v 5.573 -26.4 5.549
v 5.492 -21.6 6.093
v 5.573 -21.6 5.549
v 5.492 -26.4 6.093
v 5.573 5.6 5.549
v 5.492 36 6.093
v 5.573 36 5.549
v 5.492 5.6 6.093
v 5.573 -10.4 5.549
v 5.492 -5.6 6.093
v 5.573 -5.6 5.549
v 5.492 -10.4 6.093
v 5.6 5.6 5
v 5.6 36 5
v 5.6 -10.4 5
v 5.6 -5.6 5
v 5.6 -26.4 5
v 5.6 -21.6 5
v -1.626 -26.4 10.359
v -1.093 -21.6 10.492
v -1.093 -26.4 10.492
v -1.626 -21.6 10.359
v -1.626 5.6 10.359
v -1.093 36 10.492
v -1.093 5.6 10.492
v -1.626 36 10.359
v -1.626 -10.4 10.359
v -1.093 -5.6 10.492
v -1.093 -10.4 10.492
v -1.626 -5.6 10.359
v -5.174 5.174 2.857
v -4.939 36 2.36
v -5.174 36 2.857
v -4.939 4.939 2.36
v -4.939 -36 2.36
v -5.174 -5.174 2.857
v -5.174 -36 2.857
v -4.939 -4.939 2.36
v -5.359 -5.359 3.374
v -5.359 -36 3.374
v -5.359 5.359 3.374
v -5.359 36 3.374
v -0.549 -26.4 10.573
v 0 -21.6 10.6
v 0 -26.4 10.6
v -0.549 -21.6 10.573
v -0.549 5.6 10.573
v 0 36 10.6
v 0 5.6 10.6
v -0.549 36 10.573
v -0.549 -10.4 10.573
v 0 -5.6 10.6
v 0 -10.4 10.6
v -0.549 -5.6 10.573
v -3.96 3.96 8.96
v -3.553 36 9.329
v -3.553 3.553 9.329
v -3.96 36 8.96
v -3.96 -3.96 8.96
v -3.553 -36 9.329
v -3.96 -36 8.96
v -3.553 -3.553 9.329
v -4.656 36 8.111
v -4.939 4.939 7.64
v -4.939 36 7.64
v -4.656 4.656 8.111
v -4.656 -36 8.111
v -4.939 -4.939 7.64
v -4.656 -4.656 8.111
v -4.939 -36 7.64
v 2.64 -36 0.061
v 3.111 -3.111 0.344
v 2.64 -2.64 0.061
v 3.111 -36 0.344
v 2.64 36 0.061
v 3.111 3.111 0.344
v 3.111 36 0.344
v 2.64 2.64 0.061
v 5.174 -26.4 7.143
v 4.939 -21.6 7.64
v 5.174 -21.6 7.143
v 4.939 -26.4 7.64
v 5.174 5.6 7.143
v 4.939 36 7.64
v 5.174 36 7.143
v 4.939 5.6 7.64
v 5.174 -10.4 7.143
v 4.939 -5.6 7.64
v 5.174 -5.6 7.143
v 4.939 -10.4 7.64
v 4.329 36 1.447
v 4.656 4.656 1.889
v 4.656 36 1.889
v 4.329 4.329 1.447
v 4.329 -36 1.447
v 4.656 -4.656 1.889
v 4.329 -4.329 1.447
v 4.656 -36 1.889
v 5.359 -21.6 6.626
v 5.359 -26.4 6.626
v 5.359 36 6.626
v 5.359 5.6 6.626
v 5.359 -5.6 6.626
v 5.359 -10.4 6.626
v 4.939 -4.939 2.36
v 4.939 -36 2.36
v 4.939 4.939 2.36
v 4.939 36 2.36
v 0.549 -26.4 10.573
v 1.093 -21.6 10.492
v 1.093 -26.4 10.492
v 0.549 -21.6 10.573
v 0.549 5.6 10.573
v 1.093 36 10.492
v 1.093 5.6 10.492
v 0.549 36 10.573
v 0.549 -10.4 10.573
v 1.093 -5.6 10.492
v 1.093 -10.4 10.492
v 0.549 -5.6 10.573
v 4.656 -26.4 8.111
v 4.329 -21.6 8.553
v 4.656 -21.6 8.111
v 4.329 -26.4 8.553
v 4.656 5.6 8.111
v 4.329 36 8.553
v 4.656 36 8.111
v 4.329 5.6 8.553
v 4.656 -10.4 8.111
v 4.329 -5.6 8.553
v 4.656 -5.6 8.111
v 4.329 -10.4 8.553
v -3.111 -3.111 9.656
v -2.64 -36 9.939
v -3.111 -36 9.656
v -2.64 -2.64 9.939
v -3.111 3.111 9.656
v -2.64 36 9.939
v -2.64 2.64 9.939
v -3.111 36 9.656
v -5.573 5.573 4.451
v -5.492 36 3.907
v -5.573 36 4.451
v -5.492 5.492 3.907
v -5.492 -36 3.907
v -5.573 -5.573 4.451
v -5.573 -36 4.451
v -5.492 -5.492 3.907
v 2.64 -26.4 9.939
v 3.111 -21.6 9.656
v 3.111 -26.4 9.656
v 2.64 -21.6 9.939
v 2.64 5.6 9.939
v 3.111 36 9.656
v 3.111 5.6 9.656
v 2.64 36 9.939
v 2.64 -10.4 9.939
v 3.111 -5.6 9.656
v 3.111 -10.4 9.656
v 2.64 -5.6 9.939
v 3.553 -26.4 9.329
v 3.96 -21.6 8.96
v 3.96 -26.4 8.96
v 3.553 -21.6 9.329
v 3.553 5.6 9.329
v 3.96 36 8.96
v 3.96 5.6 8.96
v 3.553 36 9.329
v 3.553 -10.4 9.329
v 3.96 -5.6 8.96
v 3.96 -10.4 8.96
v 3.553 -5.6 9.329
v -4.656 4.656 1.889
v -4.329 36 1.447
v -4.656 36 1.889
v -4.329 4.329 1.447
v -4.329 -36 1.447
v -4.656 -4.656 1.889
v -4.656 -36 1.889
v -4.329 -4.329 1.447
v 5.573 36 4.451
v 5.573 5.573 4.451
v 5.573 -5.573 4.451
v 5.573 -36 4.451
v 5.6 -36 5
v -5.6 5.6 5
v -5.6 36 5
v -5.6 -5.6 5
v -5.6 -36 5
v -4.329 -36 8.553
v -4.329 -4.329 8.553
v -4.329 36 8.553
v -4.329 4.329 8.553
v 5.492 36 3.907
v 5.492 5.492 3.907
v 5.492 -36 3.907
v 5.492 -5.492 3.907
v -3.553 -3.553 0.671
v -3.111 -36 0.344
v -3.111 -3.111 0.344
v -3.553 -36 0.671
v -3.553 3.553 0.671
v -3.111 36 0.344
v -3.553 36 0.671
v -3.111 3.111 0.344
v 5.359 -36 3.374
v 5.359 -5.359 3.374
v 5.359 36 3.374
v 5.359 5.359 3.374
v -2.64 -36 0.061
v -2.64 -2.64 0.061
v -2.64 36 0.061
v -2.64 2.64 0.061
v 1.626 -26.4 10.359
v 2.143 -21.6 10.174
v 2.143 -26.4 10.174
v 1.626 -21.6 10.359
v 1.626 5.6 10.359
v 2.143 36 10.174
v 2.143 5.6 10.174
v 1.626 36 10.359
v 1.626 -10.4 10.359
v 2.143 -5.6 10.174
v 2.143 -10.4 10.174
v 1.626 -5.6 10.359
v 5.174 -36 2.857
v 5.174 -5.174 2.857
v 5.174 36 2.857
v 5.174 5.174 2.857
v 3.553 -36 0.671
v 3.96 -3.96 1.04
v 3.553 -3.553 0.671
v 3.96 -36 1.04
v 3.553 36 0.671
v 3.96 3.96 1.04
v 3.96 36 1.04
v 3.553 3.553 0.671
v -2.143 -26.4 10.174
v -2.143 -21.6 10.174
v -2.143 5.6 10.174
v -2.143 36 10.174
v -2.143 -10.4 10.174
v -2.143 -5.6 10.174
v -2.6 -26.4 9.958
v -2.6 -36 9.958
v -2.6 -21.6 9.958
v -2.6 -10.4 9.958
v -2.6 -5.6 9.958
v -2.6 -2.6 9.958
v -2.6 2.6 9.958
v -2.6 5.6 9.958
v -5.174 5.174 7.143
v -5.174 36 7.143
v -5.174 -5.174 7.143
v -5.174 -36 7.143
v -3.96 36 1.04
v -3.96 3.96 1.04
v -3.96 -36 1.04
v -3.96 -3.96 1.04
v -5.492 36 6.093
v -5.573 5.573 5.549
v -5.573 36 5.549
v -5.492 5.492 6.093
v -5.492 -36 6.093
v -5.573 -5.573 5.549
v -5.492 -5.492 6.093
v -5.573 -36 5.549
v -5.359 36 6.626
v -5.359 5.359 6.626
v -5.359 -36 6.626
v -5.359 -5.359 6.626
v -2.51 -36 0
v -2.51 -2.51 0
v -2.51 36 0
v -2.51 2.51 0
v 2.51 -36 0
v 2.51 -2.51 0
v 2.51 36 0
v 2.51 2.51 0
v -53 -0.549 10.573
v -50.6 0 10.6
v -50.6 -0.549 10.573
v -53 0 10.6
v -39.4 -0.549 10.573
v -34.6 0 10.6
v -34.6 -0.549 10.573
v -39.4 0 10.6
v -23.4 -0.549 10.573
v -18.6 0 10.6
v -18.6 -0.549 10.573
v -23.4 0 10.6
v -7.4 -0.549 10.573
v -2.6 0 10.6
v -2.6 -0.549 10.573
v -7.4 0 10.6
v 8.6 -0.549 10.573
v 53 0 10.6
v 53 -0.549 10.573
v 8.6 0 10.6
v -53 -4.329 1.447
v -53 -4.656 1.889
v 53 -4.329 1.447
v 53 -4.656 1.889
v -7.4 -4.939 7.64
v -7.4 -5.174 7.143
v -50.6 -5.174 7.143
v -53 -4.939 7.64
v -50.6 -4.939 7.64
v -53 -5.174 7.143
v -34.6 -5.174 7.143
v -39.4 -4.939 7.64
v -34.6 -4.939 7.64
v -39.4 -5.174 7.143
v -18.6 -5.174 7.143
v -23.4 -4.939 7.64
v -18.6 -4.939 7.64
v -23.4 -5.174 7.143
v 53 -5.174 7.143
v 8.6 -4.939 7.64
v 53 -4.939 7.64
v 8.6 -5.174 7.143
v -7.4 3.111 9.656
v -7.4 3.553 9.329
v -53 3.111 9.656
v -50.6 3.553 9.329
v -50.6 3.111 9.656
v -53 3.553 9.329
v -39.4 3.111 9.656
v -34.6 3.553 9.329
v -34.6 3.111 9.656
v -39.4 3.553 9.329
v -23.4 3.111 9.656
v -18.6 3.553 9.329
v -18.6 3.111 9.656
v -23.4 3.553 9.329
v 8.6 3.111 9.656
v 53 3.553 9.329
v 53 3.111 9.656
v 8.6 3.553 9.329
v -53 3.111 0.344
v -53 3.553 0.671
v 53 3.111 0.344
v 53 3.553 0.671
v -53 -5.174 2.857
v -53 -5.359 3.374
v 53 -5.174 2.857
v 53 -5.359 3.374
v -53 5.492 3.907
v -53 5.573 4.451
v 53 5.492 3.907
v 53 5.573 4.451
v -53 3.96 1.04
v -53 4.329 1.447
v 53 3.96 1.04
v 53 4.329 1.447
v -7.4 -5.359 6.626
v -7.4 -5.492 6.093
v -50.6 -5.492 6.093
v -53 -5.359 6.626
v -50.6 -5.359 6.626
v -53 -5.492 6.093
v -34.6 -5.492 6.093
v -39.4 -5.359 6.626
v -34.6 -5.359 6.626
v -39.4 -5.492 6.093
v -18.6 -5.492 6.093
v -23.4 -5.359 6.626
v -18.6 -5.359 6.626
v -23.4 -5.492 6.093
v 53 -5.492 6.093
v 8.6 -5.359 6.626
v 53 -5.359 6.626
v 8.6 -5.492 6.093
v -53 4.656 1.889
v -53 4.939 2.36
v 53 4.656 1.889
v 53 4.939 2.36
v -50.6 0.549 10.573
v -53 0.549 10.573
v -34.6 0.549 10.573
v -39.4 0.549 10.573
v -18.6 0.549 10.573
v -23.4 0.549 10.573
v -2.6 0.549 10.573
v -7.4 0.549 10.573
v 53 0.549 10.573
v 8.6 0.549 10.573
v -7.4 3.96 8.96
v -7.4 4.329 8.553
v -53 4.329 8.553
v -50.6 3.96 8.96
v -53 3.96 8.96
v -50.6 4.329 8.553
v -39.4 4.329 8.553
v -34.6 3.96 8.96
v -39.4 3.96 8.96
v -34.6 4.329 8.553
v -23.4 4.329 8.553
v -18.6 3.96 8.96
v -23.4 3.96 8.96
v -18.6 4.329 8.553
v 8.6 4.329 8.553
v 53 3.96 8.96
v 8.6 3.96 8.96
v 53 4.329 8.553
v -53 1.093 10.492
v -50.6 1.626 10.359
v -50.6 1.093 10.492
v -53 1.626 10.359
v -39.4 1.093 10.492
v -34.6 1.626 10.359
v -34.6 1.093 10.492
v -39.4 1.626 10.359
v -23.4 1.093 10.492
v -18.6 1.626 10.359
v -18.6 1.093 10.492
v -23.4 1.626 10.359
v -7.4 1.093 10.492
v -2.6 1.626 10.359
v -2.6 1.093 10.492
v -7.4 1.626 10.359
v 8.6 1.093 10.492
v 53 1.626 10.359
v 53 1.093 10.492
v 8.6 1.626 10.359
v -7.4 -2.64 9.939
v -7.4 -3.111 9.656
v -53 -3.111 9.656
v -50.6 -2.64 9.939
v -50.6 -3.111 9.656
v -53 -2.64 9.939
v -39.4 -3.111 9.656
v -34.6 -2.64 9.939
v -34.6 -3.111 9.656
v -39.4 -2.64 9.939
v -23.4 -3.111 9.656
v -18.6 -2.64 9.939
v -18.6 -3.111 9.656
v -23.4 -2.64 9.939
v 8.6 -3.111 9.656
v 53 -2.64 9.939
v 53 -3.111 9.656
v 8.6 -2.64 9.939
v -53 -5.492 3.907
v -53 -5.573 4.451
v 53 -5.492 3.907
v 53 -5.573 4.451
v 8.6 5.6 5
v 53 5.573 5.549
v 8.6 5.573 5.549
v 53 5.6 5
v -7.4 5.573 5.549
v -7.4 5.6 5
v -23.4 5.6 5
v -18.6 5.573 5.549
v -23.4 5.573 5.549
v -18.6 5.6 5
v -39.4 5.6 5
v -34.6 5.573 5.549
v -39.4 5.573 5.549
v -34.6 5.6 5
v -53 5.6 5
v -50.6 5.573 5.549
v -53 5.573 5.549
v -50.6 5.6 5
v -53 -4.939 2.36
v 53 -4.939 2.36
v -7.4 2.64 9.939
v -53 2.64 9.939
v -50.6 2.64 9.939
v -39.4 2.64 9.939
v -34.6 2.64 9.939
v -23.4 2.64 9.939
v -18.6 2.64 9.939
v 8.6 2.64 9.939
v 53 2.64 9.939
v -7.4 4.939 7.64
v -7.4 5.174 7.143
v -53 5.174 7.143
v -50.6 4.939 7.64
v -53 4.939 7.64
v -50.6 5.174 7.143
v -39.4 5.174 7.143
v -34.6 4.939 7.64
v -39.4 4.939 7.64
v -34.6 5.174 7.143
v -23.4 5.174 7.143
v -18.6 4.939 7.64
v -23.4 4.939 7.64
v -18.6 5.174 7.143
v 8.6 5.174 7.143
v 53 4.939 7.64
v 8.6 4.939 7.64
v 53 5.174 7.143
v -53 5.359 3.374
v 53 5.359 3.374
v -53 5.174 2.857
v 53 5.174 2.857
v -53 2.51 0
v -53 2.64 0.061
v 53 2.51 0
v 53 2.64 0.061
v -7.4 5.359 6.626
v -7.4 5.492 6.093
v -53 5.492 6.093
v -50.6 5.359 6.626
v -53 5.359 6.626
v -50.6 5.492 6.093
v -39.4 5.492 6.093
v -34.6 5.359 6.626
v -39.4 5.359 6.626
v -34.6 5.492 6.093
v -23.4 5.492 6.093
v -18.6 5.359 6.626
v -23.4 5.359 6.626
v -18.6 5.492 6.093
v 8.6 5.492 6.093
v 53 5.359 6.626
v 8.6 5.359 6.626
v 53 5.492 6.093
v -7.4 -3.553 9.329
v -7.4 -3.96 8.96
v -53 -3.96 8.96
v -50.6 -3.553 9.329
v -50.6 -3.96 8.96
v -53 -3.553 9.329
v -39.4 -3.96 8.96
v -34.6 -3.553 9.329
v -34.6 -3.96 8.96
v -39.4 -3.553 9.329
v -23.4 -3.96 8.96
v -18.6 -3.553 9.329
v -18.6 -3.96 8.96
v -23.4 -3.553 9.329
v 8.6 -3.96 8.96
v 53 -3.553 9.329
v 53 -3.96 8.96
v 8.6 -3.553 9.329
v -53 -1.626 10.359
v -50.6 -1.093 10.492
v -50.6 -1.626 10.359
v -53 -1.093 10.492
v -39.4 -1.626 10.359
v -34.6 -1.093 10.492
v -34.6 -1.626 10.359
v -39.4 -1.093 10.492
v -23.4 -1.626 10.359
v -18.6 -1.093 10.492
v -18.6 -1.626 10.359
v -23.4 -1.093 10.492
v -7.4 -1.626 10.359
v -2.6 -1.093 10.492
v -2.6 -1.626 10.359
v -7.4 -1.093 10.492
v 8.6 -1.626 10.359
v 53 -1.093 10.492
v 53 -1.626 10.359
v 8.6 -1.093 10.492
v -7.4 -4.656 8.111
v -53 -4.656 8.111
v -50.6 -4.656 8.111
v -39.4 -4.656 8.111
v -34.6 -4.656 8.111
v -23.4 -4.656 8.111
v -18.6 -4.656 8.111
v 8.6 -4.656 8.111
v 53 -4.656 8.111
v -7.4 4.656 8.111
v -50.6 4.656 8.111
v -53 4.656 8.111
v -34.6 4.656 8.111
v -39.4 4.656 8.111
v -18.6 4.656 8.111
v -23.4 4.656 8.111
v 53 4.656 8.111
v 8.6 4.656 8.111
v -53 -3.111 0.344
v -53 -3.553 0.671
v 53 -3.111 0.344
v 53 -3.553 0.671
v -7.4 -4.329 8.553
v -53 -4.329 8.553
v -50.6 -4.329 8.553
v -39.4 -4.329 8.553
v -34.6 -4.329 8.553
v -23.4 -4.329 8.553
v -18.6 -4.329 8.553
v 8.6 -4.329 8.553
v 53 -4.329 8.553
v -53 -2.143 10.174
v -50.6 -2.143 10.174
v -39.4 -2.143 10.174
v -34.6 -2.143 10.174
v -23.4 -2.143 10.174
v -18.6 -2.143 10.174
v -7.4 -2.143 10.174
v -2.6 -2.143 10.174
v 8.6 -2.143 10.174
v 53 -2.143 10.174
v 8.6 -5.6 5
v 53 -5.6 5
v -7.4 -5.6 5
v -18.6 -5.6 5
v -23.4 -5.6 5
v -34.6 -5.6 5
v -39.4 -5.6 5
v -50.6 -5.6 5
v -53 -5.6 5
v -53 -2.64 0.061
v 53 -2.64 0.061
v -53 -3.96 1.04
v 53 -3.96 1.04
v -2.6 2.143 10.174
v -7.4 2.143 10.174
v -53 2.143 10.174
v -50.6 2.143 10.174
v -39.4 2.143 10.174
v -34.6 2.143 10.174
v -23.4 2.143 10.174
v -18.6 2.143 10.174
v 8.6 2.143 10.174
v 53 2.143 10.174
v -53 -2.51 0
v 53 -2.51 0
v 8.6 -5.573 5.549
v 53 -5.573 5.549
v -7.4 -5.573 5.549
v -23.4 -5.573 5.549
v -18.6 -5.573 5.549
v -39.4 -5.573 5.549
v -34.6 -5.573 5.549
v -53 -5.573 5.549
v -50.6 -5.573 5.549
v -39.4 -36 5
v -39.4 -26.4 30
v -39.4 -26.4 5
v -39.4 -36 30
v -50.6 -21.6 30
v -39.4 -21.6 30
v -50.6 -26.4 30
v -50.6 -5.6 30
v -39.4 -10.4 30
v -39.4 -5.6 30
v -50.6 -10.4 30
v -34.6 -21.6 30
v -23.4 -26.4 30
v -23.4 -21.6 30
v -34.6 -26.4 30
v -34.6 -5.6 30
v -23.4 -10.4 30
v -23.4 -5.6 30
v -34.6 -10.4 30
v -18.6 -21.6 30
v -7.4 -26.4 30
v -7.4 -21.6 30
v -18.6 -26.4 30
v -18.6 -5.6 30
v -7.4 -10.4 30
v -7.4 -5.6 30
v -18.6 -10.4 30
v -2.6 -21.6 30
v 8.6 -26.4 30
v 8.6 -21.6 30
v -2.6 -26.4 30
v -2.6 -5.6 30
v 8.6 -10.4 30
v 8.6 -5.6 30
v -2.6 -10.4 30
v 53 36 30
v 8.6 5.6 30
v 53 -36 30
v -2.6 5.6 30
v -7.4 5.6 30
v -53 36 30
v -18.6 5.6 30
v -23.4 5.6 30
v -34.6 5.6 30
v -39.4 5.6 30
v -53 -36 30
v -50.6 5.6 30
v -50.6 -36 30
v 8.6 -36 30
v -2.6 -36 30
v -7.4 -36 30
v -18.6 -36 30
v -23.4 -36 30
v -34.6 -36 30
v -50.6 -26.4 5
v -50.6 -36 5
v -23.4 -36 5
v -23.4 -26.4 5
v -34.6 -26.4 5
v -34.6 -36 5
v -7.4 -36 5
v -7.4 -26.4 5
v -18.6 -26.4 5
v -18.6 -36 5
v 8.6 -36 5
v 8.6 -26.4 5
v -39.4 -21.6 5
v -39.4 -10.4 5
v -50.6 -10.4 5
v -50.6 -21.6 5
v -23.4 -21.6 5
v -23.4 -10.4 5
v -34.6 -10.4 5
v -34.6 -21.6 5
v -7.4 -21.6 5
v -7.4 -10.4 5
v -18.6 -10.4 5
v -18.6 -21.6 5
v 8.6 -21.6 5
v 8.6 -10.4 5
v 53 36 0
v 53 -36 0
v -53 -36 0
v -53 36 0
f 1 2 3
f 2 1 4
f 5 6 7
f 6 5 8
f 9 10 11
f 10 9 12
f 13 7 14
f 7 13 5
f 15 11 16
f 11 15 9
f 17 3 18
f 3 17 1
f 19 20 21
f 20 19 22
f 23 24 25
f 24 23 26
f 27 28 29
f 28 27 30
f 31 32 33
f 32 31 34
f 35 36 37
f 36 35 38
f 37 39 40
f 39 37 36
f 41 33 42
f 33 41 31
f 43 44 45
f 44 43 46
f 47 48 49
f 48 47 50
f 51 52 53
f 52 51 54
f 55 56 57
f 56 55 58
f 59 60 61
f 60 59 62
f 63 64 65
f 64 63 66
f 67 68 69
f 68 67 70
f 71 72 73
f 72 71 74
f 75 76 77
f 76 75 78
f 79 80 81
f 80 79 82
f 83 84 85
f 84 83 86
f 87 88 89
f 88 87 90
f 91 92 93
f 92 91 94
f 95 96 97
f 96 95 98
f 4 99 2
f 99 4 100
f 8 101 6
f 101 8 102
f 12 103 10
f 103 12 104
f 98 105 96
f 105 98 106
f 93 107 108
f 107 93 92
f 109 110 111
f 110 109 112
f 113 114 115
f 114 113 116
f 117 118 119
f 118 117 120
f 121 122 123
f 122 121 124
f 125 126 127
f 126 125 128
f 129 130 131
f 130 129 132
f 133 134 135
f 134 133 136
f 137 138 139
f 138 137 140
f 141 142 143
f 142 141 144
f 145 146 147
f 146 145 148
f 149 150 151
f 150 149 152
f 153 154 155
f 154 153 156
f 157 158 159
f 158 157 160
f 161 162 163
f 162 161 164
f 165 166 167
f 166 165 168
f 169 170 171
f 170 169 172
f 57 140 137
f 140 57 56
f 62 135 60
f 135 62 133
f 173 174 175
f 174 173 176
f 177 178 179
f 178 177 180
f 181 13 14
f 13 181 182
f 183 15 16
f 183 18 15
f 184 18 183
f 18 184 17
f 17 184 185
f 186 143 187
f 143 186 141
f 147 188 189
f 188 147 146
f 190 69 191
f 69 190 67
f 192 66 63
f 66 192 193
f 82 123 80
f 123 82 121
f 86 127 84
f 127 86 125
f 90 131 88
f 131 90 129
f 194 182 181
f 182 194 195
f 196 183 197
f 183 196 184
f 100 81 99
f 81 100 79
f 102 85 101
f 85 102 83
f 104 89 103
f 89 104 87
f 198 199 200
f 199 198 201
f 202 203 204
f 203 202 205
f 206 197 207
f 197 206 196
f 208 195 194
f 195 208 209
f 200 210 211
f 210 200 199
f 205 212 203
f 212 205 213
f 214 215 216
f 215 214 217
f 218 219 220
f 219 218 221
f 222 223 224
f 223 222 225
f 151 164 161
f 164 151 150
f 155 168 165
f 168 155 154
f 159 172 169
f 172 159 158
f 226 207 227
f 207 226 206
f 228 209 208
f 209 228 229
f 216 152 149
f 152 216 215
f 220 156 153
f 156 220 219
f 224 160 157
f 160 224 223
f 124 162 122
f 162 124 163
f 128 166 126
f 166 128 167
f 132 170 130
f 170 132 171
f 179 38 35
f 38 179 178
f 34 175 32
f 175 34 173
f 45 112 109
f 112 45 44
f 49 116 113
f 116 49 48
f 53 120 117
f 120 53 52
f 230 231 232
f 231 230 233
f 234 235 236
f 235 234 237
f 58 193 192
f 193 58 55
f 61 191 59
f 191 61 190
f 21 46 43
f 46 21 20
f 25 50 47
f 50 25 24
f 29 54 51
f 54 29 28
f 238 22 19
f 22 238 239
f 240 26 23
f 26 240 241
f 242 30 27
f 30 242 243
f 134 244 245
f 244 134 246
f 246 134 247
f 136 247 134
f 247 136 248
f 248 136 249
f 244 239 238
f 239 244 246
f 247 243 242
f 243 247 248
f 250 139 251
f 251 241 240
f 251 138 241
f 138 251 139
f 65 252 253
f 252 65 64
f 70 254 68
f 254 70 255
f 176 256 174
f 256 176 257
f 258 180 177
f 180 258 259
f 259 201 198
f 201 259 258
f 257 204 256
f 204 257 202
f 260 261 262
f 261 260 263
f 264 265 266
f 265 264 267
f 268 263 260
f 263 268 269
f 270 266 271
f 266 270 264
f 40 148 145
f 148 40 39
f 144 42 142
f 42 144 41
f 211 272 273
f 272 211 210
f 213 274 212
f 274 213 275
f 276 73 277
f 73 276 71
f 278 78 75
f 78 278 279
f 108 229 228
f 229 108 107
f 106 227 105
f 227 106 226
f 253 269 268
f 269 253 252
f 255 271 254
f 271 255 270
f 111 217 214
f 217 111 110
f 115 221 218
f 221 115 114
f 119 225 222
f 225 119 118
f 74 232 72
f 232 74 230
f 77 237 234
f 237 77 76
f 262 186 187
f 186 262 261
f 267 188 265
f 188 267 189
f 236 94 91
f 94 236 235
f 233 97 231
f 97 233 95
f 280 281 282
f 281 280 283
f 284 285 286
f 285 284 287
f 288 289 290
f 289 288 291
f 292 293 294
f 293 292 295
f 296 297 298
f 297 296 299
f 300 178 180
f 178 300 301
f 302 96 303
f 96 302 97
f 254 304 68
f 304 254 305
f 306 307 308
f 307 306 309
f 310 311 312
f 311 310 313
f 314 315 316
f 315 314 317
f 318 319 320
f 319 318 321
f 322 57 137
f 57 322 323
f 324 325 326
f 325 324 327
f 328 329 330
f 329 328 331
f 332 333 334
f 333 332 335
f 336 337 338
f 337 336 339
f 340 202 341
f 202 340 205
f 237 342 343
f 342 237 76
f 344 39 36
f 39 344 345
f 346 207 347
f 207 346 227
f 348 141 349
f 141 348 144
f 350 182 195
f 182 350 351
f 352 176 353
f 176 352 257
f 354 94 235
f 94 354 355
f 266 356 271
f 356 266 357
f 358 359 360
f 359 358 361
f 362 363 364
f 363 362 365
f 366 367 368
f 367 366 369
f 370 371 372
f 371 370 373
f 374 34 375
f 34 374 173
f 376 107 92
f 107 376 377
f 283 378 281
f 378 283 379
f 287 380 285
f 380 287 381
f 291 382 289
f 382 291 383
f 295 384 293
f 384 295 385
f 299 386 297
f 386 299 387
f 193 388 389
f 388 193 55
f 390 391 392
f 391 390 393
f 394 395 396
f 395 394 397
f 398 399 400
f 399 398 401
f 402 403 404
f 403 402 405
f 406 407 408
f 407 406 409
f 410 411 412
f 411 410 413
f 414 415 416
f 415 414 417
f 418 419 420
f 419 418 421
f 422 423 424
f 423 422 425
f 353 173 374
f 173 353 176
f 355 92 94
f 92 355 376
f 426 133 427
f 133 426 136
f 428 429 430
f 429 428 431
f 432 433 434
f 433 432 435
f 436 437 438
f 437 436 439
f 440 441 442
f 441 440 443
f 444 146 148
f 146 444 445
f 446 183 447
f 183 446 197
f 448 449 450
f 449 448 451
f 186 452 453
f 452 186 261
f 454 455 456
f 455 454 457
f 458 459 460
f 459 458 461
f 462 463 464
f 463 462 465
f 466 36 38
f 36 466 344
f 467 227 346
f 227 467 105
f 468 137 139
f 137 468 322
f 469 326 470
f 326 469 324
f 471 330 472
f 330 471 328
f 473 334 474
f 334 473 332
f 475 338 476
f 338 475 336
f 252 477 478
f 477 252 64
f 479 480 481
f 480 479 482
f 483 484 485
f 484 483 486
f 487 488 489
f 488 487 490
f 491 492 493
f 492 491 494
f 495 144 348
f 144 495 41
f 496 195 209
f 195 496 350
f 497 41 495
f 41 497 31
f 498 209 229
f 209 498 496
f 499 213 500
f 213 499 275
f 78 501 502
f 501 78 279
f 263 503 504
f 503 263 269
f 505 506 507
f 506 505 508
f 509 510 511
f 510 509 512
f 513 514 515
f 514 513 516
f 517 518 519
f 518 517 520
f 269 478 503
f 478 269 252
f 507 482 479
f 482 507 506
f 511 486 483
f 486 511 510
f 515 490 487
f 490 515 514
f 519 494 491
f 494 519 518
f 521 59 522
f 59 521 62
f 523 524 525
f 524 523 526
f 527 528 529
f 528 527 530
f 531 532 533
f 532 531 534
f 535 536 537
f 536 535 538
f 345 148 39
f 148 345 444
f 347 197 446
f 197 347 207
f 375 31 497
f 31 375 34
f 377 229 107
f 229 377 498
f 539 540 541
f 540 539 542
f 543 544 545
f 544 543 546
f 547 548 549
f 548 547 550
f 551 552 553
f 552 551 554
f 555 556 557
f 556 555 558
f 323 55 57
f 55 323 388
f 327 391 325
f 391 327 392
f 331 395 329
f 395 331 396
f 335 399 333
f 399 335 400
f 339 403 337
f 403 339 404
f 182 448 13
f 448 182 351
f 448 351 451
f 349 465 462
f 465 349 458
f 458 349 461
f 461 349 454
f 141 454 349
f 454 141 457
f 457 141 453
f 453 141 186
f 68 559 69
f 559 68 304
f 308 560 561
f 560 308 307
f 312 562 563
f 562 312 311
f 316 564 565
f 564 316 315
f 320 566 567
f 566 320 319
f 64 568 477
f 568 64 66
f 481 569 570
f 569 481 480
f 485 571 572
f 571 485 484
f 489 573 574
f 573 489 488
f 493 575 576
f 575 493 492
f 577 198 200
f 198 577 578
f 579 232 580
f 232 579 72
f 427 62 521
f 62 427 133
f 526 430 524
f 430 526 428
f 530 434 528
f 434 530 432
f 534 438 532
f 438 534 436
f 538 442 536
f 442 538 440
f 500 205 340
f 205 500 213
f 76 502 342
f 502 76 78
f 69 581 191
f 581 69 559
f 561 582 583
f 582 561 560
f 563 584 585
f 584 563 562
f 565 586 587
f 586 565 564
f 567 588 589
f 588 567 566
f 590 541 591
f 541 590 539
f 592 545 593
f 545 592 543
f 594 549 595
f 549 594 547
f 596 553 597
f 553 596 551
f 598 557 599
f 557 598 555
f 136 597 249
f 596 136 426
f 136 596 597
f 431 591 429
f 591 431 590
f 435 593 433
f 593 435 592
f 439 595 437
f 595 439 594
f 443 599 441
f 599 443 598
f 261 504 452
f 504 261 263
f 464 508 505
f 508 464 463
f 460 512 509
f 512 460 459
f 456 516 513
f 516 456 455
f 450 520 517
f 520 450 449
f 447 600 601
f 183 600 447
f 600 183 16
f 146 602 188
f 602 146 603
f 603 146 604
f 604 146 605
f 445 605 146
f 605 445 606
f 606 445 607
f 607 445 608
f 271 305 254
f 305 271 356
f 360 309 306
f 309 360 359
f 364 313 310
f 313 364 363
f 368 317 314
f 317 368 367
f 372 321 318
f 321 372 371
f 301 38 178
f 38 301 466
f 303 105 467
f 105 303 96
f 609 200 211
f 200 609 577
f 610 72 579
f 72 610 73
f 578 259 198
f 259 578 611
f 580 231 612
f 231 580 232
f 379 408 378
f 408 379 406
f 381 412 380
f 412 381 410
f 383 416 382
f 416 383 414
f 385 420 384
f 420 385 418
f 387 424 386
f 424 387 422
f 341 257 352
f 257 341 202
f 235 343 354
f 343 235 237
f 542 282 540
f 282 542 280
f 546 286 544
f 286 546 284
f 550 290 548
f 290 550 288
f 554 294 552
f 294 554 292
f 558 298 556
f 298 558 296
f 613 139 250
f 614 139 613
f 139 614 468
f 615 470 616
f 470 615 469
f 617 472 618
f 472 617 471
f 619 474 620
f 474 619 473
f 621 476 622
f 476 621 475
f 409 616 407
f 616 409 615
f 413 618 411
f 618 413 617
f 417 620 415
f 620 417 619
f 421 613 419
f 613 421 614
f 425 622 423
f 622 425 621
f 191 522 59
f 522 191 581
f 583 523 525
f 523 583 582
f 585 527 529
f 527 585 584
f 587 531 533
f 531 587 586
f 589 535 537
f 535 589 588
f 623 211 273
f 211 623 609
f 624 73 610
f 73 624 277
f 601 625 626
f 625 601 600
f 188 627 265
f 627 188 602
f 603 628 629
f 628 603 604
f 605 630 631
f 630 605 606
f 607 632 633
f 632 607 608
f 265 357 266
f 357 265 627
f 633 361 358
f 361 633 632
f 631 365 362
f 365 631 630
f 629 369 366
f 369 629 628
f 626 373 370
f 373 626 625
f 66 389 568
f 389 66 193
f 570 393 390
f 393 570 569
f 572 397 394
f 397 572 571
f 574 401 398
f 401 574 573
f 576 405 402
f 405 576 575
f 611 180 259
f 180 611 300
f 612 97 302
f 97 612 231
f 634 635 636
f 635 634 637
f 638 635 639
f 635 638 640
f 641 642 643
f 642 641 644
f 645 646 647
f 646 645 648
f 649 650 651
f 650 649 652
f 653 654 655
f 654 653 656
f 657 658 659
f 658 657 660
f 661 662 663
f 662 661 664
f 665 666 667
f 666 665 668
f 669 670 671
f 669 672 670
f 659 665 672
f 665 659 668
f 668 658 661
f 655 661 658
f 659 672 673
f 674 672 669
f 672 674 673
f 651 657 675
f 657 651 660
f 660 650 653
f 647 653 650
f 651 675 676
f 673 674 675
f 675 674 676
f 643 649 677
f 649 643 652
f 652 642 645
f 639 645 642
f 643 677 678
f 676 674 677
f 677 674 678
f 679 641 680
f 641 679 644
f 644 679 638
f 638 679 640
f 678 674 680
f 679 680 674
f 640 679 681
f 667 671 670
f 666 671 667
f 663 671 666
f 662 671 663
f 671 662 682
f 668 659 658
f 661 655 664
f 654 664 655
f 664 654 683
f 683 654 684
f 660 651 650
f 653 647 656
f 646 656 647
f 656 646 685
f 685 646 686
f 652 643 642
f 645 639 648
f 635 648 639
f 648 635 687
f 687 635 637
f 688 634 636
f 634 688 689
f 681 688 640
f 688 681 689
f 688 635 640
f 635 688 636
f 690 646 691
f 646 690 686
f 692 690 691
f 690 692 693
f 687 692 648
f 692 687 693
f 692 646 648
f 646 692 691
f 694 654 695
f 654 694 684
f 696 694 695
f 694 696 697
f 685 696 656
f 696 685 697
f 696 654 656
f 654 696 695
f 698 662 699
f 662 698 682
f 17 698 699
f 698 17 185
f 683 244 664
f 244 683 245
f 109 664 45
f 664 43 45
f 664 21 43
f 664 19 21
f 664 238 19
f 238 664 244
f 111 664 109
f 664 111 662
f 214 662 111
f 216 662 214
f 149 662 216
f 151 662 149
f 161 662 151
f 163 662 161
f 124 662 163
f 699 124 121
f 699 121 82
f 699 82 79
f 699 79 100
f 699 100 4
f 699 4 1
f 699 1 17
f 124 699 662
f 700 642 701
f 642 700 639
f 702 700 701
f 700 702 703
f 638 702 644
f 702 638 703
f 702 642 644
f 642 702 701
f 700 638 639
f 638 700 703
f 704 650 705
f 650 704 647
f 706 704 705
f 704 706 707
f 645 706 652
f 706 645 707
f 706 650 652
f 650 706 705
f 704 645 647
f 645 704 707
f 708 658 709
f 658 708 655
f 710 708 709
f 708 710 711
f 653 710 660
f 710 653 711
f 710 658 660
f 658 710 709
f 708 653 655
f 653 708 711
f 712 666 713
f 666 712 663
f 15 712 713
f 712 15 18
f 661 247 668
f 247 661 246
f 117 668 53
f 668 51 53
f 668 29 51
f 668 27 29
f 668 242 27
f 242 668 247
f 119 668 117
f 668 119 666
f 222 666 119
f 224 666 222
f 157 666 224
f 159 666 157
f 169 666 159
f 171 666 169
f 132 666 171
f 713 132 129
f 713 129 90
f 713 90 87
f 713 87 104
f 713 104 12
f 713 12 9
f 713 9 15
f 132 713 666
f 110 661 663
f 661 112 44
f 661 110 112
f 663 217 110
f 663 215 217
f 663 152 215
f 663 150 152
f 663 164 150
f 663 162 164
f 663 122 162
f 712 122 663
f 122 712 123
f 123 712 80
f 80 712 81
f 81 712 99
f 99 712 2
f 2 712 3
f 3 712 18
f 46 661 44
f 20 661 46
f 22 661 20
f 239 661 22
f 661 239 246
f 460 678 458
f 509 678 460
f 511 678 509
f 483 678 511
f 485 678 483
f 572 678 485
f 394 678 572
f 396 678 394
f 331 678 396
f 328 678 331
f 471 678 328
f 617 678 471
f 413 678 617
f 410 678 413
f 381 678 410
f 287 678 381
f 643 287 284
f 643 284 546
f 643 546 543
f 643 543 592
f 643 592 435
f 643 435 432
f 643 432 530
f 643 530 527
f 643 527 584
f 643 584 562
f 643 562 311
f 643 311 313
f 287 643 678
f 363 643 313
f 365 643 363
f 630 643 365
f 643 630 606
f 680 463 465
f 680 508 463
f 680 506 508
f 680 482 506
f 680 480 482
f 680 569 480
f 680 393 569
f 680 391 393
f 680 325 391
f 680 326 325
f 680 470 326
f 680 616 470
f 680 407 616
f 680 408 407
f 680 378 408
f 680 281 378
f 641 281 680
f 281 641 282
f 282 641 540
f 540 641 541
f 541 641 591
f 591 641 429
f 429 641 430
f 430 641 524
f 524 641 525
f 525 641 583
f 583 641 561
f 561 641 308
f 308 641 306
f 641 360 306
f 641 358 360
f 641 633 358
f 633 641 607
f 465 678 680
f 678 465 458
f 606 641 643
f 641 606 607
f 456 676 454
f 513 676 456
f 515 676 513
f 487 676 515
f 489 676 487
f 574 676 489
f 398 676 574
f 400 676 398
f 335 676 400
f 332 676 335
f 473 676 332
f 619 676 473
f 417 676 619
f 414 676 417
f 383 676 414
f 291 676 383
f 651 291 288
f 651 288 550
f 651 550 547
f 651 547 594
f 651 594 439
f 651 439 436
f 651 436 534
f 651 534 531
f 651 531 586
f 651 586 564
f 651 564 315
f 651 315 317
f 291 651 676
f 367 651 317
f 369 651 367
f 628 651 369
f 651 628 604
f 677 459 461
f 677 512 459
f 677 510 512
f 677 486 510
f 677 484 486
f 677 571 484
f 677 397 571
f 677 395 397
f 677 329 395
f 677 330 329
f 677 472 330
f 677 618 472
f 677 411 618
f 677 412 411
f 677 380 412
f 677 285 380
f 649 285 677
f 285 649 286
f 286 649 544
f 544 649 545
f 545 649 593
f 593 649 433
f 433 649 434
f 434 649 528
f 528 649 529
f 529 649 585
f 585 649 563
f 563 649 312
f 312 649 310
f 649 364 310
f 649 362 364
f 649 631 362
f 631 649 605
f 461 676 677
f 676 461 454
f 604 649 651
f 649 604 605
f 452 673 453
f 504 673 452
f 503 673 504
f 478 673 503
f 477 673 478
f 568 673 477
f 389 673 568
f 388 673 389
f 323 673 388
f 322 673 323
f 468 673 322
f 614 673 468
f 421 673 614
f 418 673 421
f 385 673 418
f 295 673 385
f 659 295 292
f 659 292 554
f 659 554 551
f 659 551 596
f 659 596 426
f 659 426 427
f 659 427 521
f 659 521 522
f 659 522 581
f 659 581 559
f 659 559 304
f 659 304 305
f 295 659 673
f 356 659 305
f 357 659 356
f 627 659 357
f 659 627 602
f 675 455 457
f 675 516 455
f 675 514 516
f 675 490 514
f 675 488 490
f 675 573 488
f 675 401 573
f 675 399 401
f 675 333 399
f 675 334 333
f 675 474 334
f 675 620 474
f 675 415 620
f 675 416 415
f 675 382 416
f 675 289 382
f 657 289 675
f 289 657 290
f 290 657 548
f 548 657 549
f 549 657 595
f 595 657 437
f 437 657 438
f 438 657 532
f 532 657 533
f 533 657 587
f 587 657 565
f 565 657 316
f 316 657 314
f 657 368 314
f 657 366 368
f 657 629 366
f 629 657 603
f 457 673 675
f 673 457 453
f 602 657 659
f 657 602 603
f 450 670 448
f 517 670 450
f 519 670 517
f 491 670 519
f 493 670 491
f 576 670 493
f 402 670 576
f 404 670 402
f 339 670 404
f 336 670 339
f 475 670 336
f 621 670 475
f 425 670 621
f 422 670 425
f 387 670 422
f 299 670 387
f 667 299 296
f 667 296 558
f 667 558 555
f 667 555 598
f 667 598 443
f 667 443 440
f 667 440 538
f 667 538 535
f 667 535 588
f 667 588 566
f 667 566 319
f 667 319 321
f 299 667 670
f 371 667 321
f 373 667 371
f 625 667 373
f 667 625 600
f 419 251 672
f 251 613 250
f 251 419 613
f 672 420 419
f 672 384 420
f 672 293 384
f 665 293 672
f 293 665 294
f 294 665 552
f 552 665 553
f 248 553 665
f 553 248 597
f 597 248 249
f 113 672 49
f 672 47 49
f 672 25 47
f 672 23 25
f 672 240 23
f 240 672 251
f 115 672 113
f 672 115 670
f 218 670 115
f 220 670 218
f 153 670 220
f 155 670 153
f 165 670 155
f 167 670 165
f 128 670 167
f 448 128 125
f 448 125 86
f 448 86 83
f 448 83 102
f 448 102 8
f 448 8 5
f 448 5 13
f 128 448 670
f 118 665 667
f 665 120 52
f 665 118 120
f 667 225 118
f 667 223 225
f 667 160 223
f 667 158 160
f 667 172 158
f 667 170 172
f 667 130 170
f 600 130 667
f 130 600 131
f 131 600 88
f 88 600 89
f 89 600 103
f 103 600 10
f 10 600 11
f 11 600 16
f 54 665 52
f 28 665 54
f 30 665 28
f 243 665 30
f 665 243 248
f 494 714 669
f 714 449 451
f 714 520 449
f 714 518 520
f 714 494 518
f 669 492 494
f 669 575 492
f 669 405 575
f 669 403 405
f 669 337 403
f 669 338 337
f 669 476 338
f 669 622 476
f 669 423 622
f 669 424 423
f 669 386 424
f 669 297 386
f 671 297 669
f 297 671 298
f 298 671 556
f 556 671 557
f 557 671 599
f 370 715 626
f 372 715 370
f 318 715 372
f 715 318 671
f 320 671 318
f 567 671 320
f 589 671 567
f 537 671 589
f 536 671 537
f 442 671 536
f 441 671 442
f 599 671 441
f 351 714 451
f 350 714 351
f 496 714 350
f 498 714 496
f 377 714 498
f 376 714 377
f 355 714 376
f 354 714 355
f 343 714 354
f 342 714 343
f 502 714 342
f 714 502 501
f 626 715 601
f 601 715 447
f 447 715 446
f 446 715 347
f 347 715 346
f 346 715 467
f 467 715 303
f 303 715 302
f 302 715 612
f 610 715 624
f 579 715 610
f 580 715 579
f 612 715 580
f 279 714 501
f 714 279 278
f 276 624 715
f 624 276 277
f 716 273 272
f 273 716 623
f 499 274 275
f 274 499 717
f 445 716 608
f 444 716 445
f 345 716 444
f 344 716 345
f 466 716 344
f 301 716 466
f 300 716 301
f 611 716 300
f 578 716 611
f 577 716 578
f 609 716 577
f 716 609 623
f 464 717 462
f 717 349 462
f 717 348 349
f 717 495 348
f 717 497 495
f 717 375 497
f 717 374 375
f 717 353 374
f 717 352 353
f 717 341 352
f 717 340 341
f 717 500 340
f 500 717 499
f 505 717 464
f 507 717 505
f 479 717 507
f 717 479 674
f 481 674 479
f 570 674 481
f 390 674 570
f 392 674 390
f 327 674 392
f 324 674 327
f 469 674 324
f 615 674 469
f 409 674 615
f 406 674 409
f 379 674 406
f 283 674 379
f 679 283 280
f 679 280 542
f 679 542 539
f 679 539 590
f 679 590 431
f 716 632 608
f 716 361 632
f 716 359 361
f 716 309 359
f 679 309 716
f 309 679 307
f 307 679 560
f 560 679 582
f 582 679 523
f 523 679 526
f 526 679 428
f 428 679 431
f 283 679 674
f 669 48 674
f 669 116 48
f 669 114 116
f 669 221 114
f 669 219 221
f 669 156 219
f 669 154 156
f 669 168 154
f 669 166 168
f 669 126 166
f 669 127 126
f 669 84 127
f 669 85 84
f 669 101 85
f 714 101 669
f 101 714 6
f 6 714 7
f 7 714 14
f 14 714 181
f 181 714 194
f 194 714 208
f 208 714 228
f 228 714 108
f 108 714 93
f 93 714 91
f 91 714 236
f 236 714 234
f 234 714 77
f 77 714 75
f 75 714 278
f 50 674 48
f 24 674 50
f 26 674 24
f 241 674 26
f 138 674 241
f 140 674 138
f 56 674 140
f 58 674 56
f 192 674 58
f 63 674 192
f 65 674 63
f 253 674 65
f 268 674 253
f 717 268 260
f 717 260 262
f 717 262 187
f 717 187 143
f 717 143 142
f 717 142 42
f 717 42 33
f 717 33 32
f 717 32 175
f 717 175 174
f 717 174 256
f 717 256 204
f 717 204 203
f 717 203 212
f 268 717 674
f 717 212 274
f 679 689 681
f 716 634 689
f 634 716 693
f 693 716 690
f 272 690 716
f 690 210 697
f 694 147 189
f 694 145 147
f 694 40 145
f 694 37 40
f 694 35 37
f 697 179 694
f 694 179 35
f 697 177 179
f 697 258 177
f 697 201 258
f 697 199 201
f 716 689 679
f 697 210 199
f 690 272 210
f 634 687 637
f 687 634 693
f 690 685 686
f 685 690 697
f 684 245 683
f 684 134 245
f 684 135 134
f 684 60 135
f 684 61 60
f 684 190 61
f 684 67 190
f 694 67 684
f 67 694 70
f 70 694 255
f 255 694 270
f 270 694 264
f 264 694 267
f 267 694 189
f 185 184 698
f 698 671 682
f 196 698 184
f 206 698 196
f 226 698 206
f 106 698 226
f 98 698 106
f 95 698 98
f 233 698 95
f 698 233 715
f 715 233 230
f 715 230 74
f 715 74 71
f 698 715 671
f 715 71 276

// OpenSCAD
// Built by bench/smallmodels/features/compiler.py from a list of features.
$fn = 64;
difference() {
  union() {
    translate([0, 0, 0]) translate([-53, -36, 0]) cube([106, 72, 30]);
  }
  union() {
    translate([0, 0, 5]) rotate([0, 0, 0]) rotate([90, 0, 0]) cylinder(d = 11.2, h = 1120, center = true);
    translate([0, 0, 5]) rotate([0, 0, 0]) rotate([0, 90, 0]) cylinder(d = 11.2, h = 1120, center = true);
    translate([-77, -48, 5]) rotate([0, 0, 0]) translate([-5.6, -5.6, 0]) cube([11.2, 11.2, 25]);
    translate([-61, -48, 5]) rotate([0, 0, 0]) translate([-5.6, -5.6, 0]) cube([11.2, 11.2, 25]);
    translate([-45, -48, 5]) rotate([0, 0, 0]) translate([-5.6, -5.6, 0]) cube([11.2, 11.2, 25]);
    translate([-29, -48, 5]) rotate([0, 0, 0]) translate([-5.6, -5.6, 0]) cube([11.2, 11.2, 25]);
    translate([-13, -48, 5]) rotate([0, 0, 0]) translate([-5.6, -5.6, 0]) cube([11.2, 11.2, 25]);
    translate([3, -48, 5]) rotate([0, 0, 0]) translate([-5.6, -5.6, 0]) cube([11.2, 11.2, 25]);
    translate([-77, -32, 5]) rotate([0, 0, 0]) translate([-5.6, -5.6, 0]) cube([11.2, 11.2, 25]);
    translate([-61, -32, 5]) rotate([0, 0, 0]) translate([-5.6, -5.6, 0]) cube([11.2, 11.2, 25]);
    translate([-45, -32, 5]) rotate([0, 0, 0]) translate([-5.6, -5.6, 0]) cube([11.2, 11.2, 25]);
    translate([-29, -32, 5]) rotate([0, 0, 0]) translate([-5.6, -5.6, 0]) cube([11.2, 11.2, 25]);
    translate([-13, -32, 5]) rotate([0, 0, 0]) translate([-5.6, -5.6, 0]) cube([11.2, 11.2, 25]);
    translate([3, -32, 5]) rotate([0, 0, 0]) translate([-5.6, -5.6, 0]) cube([11.2, 11.2, 25]);
    translate([-77, -16, 5]) rotate([0, 0, 0]) translate([-5.6, -5.6, 0]) cube([11.2, 11.2, 25]);
    translate([-61, -16, 5]) rotate([0, 0, 0]) translate([-5.6, -5.6, 0]) cube([11.2, 11.2, 25]);
    translate([-45, -16, 5]) rotate([0, 0, 0]) translate([-5.6, -5.6, 0]) cube([11.2, 11.2, 25]);
    translate([-29, -16, 5]) rotate([0, 0, 0]) translate([-5.6, -5.6, 0]) cube([11.2, 11.2, 25]);
    translate([-13, -16, 5]) rotate([0, 0, 0]) translate([-5.6, -5.6, 0]) cube([11.2, 11.2, 25]);
    translate([3, -16, 5]) rotate([0, 0, 0]) translate([-5.6, -5.6, 0]) cube([11.2, 11.2, 25]);
    translate([-77, 0, 5]) rotate([0, 0, 0]) translate([-5.6, -5.6, 0]) cube([11.2, 11.2, 25]);
    translate([-61, 0, 5]) rotate([0, 0, 0]) translate([-5.6, -5.6, 0]) cube([11.2, 11.2, 25]);
    translate([-45, 0, 5]) rotate([0, 0, 0]) translate([-5.6, -5.6, 0]) cube([11.2, 11.2, 25]);
    translate([-29, 0, 5]) rotate([0, 0, 0]) translate([-5.6, -5.6, 0]) cube([11.2, 11.2, 25]);
    translate([-13, 0, 5]) rotate([0, 0, 0]) translate([-5.6, -5.6, 0]) cube([11.2, 11.2, 25]);
    translate([3, 0, 5]) rotate([0, 0, 0]) translate([-5.6, -5.6, 0]) cube([11.2, 11.2, 25]);
  }
}
